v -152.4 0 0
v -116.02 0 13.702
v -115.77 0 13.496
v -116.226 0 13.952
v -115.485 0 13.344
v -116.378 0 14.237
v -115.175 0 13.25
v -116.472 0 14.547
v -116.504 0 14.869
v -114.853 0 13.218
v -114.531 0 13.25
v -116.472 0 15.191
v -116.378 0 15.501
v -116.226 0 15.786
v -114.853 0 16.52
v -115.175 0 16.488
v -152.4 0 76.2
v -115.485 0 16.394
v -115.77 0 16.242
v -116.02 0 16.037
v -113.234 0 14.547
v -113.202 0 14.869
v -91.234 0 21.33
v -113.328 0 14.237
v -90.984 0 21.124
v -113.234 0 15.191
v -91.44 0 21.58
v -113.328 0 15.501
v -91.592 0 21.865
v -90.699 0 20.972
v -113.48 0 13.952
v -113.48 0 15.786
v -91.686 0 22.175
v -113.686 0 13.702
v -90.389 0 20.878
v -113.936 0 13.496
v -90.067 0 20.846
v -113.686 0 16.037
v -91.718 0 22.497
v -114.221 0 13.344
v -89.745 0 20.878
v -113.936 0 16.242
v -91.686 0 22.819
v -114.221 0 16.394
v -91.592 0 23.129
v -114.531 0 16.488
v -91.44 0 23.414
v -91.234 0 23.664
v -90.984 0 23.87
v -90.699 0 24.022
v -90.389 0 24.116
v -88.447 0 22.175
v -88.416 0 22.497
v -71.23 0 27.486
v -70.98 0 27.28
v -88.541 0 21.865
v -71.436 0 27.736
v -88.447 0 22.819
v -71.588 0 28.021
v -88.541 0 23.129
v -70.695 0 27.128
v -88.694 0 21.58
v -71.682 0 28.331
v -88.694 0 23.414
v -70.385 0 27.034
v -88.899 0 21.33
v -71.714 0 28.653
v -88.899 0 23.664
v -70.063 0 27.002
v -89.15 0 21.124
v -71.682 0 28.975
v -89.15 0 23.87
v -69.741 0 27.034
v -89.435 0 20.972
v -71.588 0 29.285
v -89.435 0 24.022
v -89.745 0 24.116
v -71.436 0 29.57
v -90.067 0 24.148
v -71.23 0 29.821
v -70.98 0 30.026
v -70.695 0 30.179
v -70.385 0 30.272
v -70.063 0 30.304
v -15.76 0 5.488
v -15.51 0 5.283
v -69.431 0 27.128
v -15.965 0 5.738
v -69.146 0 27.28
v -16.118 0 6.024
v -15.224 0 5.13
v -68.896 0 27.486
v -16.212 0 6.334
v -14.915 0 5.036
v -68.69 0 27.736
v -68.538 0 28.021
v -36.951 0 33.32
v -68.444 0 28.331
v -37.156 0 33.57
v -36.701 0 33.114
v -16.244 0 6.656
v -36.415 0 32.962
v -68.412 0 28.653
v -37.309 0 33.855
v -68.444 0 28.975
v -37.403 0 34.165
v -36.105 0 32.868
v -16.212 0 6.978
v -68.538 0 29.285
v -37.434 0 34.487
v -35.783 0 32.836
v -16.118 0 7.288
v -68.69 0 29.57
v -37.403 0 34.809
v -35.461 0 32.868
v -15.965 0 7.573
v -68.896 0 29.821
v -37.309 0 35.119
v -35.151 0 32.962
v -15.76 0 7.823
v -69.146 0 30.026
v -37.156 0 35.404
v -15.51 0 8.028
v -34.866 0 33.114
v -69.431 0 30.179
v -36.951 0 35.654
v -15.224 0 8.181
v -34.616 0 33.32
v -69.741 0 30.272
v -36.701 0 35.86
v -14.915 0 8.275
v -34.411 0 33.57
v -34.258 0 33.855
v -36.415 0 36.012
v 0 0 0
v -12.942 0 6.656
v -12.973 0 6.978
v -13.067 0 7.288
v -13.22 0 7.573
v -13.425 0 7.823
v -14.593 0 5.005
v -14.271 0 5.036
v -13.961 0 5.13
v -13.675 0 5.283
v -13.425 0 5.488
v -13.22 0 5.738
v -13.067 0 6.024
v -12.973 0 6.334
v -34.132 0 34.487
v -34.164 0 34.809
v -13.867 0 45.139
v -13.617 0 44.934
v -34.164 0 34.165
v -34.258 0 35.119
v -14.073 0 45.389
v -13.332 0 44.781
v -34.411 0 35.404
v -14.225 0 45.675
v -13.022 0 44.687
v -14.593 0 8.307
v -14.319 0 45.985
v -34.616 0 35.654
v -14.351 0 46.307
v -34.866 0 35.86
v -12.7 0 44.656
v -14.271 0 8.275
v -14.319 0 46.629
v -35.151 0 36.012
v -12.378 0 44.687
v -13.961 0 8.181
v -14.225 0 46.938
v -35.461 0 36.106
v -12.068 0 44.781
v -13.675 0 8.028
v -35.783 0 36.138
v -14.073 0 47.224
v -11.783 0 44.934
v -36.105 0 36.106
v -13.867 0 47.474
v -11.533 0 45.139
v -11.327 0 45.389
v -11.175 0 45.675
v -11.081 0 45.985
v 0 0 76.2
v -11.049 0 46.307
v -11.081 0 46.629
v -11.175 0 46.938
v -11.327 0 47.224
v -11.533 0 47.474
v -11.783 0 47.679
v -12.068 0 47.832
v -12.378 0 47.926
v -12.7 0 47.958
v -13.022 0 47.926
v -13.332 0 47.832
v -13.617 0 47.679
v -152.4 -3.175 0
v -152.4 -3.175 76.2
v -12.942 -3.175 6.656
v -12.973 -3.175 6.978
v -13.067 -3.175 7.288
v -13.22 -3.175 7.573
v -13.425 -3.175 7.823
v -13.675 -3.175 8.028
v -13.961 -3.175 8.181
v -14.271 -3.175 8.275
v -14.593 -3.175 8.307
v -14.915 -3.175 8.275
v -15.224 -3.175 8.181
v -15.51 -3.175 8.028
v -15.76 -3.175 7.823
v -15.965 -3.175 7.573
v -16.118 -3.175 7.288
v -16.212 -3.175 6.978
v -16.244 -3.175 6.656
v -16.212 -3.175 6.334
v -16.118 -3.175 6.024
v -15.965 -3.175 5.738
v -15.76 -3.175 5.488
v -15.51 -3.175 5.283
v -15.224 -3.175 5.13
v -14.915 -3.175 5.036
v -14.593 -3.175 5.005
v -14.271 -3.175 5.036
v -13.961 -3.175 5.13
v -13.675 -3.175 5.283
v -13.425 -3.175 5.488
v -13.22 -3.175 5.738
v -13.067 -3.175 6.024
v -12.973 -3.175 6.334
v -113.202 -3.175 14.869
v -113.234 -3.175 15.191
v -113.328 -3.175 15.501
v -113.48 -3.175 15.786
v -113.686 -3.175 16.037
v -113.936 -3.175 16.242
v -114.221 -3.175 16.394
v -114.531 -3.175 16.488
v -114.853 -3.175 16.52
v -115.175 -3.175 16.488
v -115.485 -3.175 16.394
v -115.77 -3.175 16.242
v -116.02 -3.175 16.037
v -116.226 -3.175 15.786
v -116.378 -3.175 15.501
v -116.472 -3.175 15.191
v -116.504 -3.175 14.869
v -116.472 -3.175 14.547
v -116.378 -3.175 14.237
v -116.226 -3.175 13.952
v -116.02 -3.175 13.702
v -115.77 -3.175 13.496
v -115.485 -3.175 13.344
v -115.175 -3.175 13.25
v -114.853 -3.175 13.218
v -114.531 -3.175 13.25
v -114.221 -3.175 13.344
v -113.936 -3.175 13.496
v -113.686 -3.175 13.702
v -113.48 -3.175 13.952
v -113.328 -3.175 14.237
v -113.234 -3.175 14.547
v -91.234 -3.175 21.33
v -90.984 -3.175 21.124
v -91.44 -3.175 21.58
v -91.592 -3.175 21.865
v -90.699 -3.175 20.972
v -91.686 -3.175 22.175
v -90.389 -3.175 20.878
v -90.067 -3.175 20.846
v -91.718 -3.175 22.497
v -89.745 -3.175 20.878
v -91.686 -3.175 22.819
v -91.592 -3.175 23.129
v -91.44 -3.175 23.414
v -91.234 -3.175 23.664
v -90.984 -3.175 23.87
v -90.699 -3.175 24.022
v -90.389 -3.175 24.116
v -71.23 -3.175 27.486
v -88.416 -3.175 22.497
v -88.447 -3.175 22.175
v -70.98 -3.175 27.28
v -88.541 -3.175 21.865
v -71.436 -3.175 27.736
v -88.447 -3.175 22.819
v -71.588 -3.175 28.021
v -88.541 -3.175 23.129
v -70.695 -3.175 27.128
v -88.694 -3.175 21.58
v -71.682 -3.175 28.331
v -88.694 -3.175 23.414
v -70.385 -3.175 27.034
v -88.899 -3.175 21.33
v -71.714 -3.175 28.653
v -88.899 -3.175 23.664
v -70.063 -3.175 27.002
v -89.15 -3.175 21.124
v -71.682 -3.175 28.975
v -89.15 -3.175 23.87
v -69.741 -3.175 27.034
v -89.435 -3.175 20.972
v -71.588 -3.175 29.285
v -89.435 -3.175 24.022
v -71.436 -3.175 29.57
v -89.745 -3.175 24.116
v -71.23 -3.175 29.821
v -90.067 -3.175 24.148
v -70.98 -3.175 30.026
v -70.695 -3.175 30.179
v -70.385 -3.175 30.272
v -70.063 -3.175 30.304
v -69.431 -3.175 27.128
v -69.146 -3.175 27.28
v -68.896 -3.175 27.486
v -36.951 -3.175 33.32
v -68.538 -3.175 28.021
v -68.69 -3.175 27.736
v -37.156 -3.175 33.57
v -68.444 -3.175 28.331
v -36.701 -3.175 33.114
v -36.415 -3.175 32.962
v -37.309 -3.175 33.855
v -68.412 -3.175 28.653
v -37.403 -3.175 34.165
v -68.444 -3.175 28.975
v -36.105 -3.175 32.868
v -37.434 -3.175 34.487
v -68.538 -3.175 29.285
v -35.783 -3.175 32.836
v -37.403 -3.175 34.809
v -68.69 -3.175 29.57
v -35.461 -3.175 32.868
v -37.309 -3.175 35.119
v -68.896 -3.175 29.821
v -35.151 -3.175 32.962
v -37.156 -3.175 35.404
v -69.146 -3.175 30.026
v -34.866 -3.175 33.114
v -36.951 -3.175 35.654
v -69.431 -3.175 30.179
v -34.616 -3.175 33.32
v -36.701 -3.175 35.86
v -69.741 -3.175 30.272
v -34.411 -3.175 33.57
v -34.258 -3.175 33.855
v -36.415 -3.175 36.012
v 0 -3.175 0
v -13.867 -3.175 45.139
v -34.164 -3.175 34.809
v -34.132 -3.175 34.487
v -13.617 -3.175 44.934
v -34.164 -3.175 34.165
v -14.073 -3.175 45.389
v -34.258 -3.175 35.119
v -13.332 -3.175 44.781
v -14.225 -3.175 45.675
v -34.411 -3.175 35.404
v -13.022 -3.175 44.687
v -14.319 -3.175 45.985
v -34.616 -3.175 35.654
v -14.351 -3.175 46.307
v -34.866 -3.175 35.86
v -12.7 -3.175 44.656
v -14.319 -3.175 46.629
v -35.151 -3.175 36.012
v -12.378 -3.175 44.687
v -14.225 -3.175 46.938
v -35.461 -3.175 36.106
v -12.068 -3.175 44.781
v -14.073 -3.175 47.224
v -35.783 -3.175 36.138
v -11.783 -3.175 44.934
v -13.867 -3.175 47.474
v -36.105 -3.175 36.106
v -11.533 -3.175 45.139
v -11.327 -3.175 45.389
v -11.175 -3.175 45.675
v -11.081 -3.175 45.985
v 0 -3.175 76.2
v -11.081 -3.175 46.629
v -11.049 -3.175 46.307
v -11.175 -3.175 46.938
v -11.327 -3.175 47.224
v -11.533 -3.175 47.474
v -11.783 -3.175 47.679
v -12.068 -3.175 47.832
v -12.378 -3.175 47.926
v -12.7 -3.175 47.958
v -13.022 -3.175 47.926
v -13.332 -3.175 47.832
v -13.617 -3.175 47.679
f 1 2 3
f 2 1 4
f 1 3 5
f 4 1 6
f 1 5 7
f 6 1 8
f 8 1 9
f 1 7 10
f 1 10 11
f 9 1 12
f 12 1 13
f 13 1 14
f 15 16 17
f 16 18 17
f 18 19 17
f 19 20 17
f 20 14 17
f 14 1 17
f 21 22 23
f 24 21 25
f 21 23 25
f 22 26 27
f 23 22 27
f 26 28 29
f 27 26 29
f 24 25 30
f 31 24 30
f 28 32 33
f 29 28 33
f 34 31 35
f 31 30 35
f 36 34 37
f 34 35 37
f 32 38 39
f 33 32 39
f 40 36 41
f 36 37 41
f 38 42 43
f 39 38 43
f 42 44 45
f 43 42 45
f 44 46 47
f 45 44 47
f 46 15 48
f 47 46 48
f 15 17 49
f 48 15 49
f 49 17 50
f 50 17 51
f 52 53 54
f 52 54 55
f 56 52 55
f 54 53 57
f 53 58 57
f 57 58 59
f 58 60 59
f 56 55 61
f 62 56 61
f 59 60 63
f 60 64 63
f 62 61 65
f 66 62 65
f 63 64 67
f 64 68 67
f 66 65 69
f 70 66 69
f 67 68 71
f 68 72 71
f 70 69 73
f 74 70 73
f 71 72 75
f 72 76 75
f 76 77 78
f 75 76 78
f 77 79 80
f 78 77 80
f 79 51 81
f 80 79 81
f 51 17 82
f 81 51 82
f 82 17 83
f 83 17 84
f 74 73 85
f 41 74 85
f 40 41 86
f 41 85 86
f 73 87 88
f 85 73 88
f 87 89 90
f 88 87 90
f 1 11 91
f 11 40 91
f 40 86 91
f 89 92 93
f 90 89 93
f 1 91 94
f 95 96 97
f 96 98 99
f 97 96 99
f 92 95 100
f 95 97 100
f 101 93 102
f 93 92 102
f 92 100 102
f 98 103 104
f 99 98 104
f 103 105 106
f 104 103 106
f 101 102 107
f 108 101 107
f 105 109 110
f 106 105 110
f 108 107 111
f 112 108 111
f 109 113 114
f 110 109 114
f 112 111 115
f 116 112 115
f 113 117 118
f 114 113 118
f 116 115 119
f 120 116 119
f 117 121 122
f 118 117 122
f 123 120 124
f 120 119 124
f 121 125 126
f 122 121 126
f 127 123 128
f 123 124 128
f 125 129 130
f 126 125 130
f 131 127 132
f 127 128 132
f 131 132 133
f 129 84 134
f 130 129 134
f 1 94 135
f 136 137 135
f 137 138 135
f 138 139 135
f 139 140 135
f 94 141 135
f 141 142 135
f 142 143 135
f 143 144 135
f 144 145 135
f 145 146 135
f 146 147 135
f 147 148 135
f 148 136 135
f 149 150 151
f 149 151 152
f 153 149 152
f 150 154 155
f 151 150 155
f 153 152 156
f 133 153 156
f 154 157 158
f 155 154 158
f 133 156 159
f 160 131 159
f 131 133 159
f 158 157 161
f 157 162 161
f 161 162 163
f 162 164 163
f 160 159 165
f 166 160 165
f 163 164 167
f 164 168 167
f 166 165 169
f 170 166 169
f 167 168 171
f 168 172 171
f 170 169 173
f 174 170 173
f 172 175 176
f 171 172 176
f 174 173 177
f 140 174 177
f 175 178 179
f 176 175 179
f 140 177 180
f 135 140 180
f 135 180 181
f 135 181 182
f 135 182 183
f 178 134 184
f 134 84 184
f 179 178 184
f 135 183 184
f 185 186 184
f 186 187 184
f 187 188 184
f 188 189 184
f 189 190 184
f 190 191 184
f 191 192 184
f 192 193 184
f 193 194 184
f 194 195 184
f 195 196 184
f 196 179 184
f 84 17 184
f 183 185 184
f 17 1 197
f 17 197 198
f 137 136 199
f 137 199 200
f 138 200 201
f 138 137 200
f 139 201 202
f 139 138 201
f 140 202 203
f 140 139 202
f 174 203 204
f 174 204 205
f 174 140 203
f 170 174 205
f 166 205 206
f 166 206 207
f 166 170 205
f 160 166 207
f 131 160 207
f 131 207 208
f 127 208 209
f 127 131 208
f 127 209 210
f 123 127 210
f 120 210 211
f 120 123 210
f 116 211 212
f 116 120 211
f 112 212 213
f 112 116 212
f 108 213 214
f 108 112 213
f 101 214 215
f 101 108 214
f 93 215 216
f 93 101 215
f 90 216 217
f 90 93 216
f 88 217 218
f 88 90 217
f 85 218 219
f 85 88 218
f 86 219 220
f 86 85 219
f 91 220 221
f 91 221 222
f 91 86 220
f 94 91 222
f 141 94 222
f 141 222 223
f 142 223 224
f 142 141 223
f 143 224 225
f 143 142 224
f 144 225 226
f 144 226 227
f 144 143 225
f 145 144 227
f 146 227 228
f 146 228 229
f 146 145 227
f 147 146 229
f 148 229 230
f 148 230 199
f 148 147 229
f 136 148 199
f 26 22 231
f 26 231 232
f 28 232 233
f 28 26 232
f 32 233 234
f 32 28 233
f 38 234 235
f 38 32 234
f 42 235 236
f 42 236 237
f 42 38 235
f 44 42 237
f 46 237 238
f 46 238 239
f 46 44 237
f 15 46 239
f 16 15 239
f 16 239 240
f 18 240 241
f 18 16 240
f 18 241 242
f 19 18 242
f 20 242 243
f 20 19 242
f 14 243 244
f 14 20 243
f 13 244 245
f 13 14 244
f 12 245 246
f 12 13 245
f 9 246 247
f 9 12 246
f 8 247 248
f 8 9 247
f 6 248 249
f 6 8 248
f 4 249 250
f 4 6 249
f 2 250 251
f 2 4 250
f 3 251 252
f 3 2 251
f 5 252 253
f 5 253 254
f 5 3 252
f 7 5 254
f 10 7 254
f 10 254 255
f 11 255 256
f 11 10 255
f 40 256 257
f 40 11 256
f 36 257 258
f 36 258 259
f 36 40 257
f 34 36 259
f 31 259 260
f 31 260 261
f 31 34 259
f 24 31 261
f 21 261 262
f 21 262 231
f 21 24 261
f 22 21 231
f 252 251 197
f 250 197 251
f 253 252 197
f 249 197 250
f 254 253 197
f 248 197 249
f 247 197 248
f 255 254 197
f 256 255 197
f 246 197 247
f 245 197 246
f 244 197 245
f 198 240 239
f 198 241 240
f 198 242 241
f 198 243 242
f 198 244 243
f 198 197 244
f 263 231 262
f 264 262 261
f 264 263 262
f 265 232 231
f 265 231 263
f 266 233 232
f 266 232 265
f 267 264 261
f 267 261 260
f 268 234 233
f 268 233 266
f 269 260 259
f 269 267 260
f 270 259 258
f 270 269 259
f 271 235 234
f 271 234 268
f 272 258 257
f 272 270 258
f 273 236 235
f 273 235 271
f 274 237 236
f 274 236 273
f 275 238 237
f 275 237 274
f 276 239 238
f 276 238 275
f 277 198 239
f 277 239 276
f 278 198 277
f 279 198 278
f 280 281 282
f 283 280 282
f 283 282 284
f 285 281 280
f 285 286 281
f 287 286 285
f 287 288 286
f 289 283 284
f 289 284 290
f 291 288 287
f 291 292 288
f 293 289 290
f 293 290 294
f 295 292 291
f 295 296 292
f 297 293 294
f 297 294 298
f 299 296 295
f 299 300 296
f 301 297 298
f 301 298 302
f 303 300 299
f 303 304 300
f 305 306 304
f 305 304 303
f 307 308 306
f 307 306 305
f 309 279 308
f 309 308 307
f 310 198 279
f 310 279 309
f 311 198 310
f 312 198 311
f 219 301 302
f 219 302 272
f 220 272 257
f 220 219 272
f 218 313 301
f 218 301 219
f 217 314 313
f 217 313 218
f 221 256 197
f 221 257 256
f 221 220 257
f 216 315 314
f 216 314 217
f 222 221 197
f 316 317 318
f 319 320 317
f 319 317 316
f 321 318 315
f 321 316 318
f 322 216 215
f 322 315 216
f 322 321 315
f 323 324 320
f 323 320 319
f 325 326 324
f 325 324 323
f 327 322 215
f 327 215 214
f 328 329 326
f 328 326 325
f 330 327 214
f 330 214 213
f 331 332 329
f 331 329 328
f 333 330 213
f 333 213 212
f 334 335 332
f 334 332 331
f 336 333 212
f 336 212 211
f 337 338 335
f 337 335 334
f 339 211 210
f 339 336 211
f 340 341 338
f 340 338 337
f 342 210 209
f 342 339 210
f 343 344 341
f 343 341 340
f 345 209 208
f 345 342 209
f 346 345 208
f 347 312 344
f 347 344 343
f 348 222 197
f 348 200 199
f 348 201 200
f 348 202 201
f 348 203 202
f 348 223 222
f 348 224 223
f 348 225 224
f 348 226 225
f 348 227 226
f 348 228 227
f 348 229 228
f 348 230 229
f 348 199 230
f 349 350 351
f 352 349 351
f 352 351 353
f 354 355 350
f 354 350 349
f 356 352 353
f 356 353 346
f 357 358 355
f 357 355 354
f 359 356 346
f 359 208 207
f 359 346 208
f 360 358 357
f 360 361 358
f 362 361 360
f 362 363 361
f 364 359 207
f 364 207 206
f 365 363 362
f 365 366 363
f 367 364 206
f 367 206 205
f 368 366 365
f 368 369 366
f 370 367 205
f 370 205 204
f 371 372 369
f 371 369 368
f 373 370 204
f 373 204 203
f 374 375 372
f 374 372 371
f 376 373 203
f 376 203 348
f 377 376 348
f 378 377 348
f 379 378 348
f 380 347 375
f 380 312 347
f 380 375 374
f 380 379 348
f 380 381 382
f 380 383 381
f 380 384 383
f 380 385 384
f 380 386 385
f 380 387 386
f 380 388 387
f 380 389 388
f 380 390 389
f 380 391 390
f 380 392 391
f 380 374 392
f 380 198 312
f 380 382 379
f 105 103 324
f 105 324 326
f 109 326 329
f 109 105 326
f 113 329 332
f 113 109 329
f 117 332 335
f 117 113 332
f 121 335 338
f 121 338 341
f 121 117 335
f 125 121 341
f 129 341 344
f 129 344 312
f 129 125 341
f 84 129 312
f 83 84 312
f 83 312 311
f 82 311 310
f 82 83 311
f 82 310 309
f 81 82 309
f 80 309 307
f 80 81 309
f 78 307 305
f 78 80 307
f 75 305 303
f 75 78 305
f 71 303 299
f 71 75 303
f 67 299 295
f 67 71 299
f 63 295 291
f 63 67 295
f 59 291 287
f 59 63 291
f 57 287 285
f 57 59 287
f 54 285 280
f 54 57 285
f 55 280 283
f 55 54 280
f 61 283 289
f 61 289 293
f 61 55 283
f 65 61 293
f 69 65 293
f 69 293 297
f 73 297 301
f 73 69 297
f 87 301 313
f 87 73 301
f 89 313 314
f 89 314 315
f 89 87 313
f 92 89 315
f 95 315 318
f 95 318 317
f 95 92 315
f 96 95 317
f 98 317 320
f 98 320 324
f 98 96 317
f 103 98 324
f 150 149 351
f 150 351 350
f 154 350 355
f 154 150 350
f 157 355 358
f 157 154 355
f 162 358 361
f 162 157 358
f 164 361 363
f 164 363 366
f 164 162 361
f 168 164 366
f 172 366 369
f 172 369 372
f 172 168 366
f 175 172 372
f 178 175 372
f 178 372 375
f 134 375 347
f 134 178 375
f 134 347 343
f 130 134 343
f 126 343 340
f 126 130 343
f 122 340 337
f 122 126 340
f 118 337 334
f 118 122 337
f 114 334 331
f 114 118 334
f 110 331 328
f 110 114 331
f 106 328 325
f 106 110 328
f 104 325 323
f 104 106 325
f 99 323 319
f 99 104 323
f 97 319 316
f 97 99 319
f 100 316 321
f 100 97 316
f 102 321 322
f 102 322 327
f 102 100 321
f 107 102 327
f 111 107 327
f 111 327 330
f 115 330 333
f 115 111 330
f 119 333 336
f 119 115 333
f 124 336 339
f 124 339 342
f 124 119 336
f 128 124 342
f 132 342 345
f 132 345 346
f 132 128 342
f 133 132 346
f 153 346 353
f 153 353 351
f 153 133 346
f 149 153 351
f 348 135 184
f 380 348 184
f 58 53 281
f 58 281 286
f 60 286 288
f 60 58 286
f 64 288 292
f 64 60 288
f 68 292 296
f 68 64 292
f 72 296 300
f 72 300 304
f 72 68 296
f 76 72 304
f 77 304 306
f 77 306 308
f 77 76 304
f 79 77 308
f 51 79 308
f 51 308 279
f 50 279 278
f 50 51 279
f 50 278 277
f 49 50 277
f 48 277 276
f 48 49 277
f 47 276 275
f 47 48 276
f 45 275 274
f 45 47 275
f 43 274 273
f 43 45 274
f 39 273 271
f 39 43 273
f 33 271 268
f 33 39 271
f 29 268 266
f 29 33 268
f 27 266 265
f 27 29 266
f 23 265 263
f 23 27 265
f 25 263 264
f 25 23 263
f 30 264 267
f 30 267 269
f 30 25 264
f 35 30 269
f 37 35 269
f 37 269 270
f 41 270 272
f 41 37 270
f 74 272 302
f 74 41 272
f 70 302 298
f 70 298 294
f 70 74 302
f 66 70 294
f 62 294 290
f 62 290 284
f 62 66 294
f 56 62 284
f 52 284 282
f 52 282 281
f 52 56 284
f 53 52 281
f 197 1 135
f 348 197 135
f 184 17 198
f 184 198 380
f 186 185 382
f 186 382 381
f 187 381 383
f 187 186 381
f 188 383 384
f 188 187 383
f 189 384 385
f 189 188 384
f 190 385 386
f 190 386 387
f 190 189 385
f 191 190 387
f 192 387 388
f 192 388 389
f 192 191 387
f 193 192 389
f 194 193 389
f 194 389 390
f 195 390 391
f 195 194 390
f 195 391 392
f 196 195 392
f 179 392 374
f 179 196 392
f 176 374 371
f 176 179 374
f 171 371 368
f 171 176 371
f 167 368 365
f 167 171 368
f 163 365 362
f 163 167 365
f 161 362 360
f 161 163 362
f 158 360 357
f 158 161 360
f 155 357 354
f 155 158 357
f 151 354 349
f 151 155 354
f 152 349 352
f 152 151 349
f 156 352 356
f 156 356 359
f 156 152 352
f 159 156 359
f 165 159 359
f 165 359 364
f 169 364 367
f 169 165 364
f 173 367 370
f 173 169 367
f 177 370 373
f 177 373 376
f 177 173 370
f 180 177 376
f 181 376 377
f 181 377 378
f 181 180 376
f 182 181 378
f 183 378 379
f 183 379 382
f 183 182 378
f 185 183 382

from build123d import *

# Parameters (mm, degrees)
F0_W     = 152.4
F0_H     = 76.2
F0_R     = 1.651
F1_DEPTH = 3.175


with BuildPart() as f1:
    # F0 (on Front) → F1 (new body)
    with BuildSketch(Plane.XZ):
        with Locations((-76.2, 38.1)):
            Rectangle(F0_W, F0_H)
        with Locations((-114.852957, 14.869115)):
            Circle(F0_R, mode=Mode.SUBTRACT)
        with Locations((-90.066759, 22.497064)):
            Circle(F0_R, mode=Mode.SUBTRACT)
        with Locations((-14.592638, 6.6557)):
            Circle(F0_R, mode=Mode.SUBTRACT)
        with Locations((-70.06301, 28.653214)):
            Circle(F0_R, mode=Mode.SUBTRACT)
        with Locations((-35.783276, 34.487042)):
            Circle(F0_R, mode=Mode.SUBTRACT)
        with Locations((-12.7, 46.30667)):
            Circle(F0_R, mode=Mode.SUBTRACT)
    extrude(amount=F1_DEPTH)


solid = f1.part
